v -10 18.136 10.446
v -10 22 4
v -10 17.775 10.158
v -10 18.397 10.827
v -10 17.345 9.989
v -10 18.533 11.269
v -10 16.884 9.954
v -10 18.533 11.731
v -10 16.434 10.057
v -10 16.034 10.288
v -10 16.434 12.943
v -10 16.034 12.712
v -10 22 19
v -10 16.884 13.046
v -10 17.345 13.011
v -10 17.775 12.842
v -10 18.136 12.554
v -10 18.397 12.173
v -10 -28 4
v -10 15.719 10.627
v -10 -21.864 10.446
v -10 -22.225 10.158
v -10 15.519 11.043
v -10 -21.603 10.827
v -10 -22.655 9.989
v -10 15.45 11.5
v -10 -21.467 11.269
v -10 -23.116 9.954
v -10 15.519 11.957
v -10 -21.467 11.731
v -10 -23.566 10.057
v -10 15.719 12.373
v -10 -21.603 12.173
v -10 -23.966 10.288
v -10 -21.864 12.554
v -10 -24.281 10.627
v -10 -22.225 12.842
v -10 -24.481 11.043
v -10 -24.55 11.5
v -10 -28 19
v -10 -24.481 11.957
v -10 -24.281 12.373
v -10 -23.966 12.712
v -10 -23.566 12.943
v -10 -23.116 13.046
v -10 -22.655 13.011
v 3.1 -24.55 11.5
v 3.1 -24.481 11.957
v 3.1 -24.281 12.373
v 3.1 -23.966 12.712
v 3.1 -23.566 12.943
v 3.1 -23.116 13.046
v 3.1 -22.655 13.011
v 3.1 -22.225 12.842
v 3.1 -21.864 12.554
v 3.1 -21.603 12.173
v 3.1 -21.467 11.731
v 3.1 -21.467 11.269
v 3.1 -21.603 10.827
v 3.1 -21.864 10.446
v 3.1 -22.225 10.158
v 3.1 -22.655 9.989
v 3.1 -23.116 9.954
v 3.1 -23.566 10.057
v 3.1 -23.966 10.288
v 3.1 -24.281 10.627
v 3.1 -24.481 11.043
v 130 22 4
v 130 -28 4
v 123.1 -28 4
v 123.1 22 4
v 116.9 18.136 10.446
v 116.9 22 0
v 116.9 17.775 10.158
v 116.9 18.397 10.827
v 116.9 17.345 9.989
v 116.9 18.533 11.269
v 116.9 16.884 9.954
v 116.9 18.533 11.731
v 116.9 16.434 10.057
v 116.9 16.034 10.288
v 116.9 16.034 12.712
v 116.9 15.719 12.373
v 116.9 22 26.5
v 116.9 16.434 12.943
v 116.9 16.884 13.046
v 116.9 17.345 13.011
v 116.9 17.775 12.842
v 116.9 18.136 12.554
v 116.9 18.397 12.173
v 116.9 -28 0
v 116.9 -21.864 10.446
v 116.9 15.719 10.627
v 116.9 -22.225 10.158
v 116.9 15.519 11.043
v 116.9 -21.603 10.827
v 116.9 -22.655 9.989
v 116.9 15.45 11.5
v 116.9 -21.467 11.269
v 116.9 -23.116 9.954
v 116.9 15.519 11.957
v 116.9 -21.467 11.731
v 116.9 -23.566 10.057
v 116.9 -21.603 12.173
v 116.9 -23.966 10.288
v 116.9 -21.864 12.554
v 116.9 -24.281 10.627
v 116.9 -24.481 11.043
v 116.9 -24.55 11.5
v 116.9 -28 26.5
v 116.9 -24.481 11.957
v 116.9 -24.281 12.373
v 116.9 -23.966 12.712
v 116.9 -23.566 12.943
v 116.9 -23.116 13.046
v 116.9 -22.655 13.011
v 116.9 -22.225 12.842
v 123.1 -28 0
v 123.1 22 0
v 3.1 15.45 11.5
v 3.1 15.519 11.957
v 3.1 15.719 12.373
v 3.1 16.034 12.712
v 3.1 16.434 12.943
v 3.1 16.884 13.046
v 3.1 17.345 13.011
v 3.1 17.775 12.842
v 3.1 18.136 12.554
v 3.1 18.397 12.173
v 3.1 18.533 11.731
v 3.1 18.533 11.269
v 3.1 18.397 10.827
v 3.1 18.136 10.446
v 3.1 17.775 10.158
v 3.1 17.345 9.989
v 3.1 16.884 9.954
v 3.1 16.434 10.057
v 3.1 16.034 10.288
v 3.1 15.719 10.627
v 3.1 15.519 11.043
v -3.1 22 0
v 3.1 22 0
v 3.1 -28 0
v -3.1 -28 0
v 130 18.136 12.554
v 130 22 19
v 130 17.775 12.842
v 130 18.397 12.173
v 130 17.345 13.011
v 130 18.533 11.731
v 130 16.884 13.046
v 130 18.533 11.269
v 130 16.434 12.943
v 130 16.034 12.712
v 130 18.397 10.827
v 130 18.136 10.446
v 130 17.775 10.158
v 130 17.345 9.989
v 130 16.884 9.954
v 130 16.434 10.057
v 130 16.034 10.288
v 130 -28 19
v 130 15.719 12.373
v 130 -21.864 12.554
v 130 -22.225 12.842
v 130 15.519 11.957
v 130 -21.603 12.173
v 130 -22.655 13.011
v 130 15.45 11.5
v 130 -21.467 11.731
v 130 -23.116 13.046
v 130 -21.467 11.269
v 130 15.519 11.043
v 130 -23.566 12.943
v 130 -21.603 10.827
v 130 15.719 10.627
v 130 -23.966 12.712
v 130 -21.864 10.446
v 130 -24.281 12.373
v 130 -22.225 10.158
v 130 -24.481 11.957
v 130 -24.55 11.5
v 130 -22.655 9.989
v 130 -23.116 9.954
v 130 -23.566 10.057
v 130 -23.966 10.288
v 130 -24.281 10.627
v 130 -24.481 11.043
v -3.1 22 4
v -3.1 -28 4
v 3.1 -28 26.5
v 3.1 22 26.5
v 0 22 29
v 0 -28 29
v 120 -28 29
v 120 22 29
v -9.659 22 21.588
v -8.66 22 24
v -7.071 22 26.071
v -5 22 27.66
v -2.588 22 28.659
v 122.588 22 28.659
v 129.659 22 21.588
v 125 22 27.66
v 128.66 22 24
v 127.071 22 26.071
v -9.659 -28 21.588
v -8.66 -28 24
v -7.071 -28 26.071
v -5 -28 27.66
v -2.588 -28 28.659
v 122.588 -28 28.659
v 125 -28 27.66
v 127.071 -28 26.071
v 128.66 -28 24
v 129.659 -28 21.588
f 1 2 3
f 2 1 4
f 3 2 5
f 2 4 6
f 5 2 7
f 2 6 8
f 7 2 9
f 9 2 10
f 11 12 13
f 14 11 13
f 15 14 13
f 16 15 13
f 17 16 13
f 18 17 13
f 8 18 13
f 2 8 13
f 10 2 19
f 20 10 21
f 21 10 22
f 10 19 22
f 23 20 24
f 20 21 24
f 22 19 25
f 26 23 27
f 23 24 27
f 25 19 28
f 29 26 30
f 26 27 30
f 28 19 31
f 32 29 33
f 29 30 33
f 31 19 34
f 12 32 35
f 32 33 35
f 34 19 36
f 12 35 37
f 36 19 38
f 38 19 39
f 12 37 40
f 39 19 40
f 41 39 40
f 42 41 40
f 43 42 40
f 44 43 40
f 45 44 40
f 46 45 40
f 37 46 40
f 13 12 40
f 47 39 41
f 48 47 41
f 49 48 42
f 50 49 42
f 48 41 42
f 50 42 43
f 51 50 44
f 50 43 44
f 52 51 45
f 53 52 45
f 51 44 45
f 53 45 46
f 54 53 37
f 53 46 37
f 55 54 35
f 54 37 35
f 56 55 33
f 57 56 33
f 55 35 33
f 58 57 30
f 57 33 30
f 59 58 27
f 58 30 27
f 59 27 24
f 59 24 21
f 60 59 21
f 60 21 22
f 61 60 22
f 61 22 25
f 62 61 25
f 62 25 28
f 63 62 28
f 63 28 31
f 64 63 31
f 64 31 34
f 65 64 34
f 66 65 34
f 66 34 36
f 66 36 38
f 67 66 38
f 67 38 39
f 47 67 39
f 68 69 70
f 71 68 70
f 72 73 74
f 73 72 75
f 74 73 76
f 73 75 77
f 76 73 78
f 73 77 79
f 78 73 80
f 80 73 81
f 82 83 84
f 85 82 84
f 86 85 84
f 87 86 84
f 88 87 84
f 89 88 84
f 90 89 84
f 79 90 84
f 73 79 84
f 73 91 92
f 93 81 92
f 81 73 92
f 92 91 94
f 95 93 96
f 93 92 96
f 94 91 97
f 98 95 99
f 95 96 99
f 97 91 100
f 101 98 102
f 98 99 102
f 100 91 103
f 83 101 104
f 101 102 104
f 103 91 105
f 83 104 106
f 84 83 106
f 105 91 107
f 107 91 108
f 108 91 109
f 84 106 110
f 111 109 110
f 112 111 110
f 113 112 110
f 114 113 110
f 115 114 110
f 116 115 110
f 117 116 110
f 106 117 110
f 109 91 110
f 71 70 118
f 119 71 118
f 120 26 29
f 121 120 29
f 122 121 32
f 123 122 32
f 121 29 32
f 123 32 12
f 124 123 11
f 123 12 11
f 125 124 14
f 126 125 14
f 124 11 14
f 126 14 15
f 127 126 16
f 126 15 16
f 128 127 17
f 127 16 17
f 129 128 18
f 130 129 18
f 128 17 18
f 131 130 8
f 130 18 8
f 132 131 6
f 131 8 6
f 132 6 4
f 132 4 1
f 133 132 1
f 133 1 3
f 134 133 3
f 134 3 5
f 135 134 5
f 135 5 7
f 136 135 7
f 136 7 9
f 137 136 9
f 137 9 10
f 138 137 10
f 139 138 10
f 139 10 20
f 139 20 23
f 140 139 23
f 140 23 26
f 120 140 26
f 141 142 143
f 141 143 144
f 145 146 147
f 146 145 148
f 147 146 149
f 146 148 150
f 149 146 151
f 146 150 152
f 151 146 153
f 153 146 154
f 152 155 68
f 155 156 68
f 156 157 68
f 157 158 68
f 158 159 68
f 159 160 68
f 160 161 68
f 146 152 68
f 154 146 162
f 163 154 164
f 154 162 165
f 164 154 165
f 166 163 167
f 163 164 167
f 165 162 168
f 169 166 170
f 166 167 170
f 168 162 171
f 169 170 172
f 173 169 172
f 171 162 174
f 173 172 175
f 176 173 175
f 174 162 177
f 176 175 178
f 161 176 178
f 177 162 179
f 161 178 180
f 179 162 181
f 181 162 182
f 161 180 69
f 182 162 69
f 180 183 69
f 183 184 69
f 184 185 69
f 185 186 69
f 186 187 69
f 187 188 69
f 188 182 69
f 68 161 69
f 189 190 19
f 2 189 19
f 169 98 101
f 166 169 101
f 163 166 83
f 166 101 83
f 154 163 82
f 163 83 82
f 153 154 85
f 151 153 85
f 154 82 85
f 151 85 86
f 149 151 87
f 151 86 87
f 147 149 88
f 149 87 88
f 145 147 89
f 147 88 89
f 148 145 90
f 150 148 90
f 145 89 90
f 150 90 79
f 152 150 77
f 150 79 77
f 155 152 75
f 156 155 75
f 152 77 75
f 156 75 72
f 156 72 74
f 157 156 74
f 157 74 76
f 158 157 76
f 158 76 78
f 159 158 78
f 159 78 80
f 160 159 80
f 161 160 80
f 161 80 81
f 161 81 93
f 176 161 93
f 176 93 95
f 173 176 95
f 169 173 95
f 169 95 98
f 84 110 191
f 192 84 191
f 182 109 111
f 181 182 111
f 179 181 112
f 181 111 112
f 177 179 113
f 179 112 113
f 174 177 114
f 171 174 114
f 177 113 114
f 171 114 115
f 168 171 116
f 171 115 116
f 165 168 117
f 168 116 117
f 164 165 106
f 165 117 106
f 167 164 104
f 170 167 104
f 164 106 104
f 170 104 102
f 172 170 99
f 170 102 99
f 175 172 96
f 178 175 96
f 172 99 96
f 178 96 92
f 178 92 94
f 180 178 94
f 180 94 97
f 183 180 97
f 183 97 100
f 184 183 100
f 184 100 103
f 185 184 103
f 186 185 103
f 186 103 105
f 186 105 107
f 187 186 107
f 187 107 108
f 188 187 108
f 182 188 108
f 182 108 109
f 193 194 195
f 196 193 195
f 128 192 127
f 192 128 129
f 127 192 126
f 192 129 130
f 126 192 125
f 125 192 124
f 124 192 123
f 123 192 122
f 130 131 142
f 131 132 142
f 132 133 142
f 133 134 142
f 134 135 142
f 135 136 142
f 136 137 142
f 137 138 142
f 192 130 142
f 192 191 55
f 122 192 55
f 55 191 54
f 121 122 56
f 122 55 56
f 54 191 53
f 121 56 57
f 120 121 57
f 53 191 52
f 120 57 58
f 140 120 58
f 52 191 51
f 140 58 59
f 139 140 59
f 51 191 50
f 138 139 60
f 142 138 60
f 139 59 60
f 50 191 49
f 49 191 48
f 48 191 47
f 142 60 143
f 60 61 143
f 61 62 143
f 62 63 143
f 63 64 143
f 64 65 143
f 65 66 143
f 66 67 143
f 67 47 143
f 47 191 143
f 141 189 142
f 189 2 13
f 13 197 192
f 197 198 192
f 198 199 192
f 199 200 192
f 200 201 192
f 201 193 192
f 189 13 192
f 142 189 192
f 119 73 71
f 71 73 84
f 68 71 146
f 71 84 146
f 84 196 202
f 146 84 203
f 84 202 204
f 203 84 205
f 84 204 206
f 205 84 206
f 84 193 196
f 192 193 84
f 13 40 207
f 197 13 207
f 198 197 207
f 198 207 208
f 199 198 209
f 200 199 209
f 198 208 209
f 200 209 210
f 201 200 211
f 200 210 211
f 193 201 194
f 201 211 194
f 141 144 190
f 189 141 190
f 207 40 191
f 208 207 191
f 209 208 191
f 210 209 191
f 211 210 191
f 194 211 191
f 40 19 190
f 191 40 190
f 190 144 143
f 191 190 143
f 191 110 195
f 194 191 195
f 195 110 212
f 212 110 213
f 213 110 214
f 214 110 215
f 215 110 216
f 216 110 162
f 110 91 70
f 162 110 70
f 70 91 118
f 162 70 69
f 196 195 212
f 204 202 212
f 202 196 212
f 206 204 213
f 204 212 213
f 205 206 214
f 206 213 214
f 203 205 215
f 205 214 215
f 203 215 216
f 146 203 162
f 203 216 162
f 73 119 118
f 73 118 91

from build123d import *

# Parameters (mm, degrees)
EXTRUDE_1_DEPTH     = 14
CUT_EXTRUDE_1_DEPTH = 44
SKETCH_3_W          = 6.2
SKETCH_3_H          = 6.2
CUT_EXTRUDE_2_DEPTH = 4
SKETCH_4_R          = 4
CUT_EXTRUDE_3_DEPTH = 5
SKETCH_5_R          = 2.6
CUT_EXTRUDE_4_DEPTH = 5
SKETCH_6_R          = 4
EXTRUDE_2_DEPTH     = 10
SKETCH_7_W          = 6.2
SKETCH_7_H          = 4
EXTRUDE_3_DEPTH     = 40
CUT_EXTRUDE_5_DEPTH = 50
SKETCH_9_W          = 20
SKETCH_9_H          = 25
EXTRUDE_4_DEPTH     = 44
CUT_EXTRUDE_6_DEPTH = 44
EXTRUDE_5_DEPTH     = 44
SKETCH_12_W         = 6.9
SKETCH_12_H         = 22.5
CUT_EXTRUDE_7_DEPTH = 50
EXTRUDE_START       = 6
EXTRUDE_6_DEPTH     = 6
SKETCH_15_R         = 1.55
CUT_EXTRUDE_8_DEPTH = 2000


with BuildPart() as part:
    # 草图1 → 凸台-拉伸1 (new body)
    with BuildSketch(Plane.XY):
        Polygon((-15, 22), (-15, -22), (15, -22), (15, 22), (0, 22), align=None)
    extrude(amount=EXTRUDE_1_DEPTH)

    # 草图2 → 切除-拉伸1 (cut)
    with BuildSketch(Plane(origin=(0, 22, 0), x_dir=(1, 0, 0), z_dir=(0, 1, 0))):
        Polygon((-15, 0), (-15, -14), (-10, -4), (-3.1, -4), (-3.1, 0), align=None)
        Polygon((3.1, -4), (10, -4), (15, -14), (15, 0), (3.1, 0), align=None)
    extrude(amount=-CUT_EXTRUDE_1_DEPTH, mode=Mode.SUBTRACT)

    # 草图3 → 切除-拉伸2 (cut)
    with BuildSketch(Plane(origin=(0, 0, 0), x_dir=(-1, 0, 0), z_dir=(0, 0, -1))):
        Rectangle(SKETCH_3_W, SKETCH_3_H)
    extrude(amount=-CUT_EXTRUDE_2_DEPTH, mode=Mode.SUBTRACT)

    # 草图4 → 切除-拉伸3 (cut)
    with BuildSketch(Plane.XY.offset(14)):
        Circle(SKETCH_4_R)
    extrude(amount=-CUT_EXTRUDE_3_DEPTH, mode=Mode.SUBTRACT)

    # 草图5 → 切除-拉伸4 (cut)
    with BuildSketch(Plane.XY.offset(9)):
        Circle(SKETCH_5_R)
    extrude(amount=-CUT_EXTRUDE_4_DEPTH, mode=Mode.SUBTRACT)

    # 草图6 → 凸台-拉伸2 (add)
    with BuildSketch(Plane.XY.offset(14)):
        Circle(SKETCH_6_R)
    extrude(amount=-EXTRUDE_2_DEPTH)

    # 草图7 → 凸台-拉伸3 (add)
    with BuildSketch(Plane(origin=(0, -22, 0), x_dir=(-1, 0, 0), z_dir=(0, -1, 0))):
        with Locations((0, -2)):
            Rectangle(SKETCH_7_W, SKETCH_7_H)
    extrude(amount=-EXTRUDE_3_DEPTH)

    # 草图8 → 切除-拉伸5 (cut)
    with BuildSketch(Plane.XZ.offset(22)):
        Polygon((-15, 14), (-10, 4), (-10, 14), align=None)
        Polygon((15, 14), (10, 14), (10, 4), align=None)
    extrude(amount=-CUT_EXTRUDE_5_DEPTH, mode=Mode.SUBTRACT)

    # 草图9 → 凸台-拉伸4 (add)
    with BuildSketch(Plane.XZ.offset(22)):
        with Locations((0, 16.5)):
            Rectangle(SKETCH_9_W, SKETCH_9_H)
    extrude(amount=-EXTRUDE_4_DEPTH)

    # 草图10 → 切除-拉伸6 (cut)
    with BuildSketch(Plane.XZ.offset(22)):
        with BuildLine():
            Line((-10, 29), (-10, 19))
            ThreePointArc((-10, 19), (-7.071067812, 26.071067812), (0, 29))
            Line((0, 29), (-10, 29))
        make_face()
    extrude(amount=-CUT_EXTRUDE_6_DEPTH, mode=Mode.SUBTRACT)

    # 草图11 → 凸台-拉伸5 (add)
    with BuildSketch(Plane.XZ.offset(22)):
        with BuildLine():
            Line((120, 0), (123.1, 0))
            Line((123.1, 0), (123.1, 4))
            Line((123.1, 4), (130, 4))
            Line((130, 4), (130, 19))
            ThreePointArc((130, 19), (127.071067812, 26.071067812), (120, 29))
            Line((120, 29), (110, 29))
            Line((110, 29), (10, 29))
            Line((10, 29), (10, 26.5))
            Line((10, 26.5), (110, 26.5))
            Line((110, 26.5), (110, 4))
            Line((110, 4), (116.9, 4))
            Line((116.9, 4), (116.9, 0))
            Line((116.9, 0), (120, 0))
        make_face()
    extrude(amount=-EXTRUDE_5_DEPTH)

    # 草图12 → 切除-拉伸7 (cut)
    with BuildSketch(Plane(origin=(0, 22, 0), x_dir=(1, 0, 0), z_dir=(0, 1, 0))):
        with Locations((6.55, -15.25)):
            Rectangle(SKETCH_12_W, SKETCH_12_H)
        with Locations((113.45, -15.25)):
            Rectangle(SKETCH_12_W, SKETCH_12_H)
    extrude(amount=-CUT_EXTRUDE_7_DEPTH, mode=Mode.SUBTRACT)

    # 草图14 → 凸台-拉伸6 (add)
    with BuildSketch(Plane(origin=(0, -22, 0), x_dir=(-1, 0, 0), z_dir=(0, -1, 0)).offset(EXTRUDE_START)):
        with BuildLine():
            Line((3.1, 0), (3.1, -4))
            Line((3.1, -4), (10, -4))
            Line((10, -4), (10, -19))
            ThreePointArc((10, -19), (7.071067812, -26.071067812), (0, -29))
            Line((0, -29), (-120, -29))
            ThreePointArc((-120, -29), (-127.071067812, -26.071067812), (-130, -19))
            Line((-130, -19), (-130, -4))
            Line((-130, -4), (-123.1, -4))
            Line((-123.1, -4), (-123.1, 0))
            Line((-123.1, 0), (-116.9, 0))
            Line((-116.9, 0), (-116.9, -26.5))
            Line((-116.9, -26.5), (-3.1, -26.5))
            Line((-3.1, -26.5), (-3.1, 0))
            Line((-3.1, 0), (3.1, 0))
        make_face()
    extrude(amount=-EXTRUDE_6_DEPTH)

    # 草图15 → 切除-拉伸8 (cut)
    with BuildSketch(Plane.ZY.offset(10)):
        with Locations(Location((11.5, 17, 0), (0, 0, 270))):
            Circle(SKETCH_15_R)
        with Locations(Location((11.5, -23, 0), (0, 0, 270))):
            Circle(SKETCH_15_R)
    extrude(amount=-CUT_EXTRUDE_8_DEPTH, mode=Mode.SUBTRACT)


solid = part.part
